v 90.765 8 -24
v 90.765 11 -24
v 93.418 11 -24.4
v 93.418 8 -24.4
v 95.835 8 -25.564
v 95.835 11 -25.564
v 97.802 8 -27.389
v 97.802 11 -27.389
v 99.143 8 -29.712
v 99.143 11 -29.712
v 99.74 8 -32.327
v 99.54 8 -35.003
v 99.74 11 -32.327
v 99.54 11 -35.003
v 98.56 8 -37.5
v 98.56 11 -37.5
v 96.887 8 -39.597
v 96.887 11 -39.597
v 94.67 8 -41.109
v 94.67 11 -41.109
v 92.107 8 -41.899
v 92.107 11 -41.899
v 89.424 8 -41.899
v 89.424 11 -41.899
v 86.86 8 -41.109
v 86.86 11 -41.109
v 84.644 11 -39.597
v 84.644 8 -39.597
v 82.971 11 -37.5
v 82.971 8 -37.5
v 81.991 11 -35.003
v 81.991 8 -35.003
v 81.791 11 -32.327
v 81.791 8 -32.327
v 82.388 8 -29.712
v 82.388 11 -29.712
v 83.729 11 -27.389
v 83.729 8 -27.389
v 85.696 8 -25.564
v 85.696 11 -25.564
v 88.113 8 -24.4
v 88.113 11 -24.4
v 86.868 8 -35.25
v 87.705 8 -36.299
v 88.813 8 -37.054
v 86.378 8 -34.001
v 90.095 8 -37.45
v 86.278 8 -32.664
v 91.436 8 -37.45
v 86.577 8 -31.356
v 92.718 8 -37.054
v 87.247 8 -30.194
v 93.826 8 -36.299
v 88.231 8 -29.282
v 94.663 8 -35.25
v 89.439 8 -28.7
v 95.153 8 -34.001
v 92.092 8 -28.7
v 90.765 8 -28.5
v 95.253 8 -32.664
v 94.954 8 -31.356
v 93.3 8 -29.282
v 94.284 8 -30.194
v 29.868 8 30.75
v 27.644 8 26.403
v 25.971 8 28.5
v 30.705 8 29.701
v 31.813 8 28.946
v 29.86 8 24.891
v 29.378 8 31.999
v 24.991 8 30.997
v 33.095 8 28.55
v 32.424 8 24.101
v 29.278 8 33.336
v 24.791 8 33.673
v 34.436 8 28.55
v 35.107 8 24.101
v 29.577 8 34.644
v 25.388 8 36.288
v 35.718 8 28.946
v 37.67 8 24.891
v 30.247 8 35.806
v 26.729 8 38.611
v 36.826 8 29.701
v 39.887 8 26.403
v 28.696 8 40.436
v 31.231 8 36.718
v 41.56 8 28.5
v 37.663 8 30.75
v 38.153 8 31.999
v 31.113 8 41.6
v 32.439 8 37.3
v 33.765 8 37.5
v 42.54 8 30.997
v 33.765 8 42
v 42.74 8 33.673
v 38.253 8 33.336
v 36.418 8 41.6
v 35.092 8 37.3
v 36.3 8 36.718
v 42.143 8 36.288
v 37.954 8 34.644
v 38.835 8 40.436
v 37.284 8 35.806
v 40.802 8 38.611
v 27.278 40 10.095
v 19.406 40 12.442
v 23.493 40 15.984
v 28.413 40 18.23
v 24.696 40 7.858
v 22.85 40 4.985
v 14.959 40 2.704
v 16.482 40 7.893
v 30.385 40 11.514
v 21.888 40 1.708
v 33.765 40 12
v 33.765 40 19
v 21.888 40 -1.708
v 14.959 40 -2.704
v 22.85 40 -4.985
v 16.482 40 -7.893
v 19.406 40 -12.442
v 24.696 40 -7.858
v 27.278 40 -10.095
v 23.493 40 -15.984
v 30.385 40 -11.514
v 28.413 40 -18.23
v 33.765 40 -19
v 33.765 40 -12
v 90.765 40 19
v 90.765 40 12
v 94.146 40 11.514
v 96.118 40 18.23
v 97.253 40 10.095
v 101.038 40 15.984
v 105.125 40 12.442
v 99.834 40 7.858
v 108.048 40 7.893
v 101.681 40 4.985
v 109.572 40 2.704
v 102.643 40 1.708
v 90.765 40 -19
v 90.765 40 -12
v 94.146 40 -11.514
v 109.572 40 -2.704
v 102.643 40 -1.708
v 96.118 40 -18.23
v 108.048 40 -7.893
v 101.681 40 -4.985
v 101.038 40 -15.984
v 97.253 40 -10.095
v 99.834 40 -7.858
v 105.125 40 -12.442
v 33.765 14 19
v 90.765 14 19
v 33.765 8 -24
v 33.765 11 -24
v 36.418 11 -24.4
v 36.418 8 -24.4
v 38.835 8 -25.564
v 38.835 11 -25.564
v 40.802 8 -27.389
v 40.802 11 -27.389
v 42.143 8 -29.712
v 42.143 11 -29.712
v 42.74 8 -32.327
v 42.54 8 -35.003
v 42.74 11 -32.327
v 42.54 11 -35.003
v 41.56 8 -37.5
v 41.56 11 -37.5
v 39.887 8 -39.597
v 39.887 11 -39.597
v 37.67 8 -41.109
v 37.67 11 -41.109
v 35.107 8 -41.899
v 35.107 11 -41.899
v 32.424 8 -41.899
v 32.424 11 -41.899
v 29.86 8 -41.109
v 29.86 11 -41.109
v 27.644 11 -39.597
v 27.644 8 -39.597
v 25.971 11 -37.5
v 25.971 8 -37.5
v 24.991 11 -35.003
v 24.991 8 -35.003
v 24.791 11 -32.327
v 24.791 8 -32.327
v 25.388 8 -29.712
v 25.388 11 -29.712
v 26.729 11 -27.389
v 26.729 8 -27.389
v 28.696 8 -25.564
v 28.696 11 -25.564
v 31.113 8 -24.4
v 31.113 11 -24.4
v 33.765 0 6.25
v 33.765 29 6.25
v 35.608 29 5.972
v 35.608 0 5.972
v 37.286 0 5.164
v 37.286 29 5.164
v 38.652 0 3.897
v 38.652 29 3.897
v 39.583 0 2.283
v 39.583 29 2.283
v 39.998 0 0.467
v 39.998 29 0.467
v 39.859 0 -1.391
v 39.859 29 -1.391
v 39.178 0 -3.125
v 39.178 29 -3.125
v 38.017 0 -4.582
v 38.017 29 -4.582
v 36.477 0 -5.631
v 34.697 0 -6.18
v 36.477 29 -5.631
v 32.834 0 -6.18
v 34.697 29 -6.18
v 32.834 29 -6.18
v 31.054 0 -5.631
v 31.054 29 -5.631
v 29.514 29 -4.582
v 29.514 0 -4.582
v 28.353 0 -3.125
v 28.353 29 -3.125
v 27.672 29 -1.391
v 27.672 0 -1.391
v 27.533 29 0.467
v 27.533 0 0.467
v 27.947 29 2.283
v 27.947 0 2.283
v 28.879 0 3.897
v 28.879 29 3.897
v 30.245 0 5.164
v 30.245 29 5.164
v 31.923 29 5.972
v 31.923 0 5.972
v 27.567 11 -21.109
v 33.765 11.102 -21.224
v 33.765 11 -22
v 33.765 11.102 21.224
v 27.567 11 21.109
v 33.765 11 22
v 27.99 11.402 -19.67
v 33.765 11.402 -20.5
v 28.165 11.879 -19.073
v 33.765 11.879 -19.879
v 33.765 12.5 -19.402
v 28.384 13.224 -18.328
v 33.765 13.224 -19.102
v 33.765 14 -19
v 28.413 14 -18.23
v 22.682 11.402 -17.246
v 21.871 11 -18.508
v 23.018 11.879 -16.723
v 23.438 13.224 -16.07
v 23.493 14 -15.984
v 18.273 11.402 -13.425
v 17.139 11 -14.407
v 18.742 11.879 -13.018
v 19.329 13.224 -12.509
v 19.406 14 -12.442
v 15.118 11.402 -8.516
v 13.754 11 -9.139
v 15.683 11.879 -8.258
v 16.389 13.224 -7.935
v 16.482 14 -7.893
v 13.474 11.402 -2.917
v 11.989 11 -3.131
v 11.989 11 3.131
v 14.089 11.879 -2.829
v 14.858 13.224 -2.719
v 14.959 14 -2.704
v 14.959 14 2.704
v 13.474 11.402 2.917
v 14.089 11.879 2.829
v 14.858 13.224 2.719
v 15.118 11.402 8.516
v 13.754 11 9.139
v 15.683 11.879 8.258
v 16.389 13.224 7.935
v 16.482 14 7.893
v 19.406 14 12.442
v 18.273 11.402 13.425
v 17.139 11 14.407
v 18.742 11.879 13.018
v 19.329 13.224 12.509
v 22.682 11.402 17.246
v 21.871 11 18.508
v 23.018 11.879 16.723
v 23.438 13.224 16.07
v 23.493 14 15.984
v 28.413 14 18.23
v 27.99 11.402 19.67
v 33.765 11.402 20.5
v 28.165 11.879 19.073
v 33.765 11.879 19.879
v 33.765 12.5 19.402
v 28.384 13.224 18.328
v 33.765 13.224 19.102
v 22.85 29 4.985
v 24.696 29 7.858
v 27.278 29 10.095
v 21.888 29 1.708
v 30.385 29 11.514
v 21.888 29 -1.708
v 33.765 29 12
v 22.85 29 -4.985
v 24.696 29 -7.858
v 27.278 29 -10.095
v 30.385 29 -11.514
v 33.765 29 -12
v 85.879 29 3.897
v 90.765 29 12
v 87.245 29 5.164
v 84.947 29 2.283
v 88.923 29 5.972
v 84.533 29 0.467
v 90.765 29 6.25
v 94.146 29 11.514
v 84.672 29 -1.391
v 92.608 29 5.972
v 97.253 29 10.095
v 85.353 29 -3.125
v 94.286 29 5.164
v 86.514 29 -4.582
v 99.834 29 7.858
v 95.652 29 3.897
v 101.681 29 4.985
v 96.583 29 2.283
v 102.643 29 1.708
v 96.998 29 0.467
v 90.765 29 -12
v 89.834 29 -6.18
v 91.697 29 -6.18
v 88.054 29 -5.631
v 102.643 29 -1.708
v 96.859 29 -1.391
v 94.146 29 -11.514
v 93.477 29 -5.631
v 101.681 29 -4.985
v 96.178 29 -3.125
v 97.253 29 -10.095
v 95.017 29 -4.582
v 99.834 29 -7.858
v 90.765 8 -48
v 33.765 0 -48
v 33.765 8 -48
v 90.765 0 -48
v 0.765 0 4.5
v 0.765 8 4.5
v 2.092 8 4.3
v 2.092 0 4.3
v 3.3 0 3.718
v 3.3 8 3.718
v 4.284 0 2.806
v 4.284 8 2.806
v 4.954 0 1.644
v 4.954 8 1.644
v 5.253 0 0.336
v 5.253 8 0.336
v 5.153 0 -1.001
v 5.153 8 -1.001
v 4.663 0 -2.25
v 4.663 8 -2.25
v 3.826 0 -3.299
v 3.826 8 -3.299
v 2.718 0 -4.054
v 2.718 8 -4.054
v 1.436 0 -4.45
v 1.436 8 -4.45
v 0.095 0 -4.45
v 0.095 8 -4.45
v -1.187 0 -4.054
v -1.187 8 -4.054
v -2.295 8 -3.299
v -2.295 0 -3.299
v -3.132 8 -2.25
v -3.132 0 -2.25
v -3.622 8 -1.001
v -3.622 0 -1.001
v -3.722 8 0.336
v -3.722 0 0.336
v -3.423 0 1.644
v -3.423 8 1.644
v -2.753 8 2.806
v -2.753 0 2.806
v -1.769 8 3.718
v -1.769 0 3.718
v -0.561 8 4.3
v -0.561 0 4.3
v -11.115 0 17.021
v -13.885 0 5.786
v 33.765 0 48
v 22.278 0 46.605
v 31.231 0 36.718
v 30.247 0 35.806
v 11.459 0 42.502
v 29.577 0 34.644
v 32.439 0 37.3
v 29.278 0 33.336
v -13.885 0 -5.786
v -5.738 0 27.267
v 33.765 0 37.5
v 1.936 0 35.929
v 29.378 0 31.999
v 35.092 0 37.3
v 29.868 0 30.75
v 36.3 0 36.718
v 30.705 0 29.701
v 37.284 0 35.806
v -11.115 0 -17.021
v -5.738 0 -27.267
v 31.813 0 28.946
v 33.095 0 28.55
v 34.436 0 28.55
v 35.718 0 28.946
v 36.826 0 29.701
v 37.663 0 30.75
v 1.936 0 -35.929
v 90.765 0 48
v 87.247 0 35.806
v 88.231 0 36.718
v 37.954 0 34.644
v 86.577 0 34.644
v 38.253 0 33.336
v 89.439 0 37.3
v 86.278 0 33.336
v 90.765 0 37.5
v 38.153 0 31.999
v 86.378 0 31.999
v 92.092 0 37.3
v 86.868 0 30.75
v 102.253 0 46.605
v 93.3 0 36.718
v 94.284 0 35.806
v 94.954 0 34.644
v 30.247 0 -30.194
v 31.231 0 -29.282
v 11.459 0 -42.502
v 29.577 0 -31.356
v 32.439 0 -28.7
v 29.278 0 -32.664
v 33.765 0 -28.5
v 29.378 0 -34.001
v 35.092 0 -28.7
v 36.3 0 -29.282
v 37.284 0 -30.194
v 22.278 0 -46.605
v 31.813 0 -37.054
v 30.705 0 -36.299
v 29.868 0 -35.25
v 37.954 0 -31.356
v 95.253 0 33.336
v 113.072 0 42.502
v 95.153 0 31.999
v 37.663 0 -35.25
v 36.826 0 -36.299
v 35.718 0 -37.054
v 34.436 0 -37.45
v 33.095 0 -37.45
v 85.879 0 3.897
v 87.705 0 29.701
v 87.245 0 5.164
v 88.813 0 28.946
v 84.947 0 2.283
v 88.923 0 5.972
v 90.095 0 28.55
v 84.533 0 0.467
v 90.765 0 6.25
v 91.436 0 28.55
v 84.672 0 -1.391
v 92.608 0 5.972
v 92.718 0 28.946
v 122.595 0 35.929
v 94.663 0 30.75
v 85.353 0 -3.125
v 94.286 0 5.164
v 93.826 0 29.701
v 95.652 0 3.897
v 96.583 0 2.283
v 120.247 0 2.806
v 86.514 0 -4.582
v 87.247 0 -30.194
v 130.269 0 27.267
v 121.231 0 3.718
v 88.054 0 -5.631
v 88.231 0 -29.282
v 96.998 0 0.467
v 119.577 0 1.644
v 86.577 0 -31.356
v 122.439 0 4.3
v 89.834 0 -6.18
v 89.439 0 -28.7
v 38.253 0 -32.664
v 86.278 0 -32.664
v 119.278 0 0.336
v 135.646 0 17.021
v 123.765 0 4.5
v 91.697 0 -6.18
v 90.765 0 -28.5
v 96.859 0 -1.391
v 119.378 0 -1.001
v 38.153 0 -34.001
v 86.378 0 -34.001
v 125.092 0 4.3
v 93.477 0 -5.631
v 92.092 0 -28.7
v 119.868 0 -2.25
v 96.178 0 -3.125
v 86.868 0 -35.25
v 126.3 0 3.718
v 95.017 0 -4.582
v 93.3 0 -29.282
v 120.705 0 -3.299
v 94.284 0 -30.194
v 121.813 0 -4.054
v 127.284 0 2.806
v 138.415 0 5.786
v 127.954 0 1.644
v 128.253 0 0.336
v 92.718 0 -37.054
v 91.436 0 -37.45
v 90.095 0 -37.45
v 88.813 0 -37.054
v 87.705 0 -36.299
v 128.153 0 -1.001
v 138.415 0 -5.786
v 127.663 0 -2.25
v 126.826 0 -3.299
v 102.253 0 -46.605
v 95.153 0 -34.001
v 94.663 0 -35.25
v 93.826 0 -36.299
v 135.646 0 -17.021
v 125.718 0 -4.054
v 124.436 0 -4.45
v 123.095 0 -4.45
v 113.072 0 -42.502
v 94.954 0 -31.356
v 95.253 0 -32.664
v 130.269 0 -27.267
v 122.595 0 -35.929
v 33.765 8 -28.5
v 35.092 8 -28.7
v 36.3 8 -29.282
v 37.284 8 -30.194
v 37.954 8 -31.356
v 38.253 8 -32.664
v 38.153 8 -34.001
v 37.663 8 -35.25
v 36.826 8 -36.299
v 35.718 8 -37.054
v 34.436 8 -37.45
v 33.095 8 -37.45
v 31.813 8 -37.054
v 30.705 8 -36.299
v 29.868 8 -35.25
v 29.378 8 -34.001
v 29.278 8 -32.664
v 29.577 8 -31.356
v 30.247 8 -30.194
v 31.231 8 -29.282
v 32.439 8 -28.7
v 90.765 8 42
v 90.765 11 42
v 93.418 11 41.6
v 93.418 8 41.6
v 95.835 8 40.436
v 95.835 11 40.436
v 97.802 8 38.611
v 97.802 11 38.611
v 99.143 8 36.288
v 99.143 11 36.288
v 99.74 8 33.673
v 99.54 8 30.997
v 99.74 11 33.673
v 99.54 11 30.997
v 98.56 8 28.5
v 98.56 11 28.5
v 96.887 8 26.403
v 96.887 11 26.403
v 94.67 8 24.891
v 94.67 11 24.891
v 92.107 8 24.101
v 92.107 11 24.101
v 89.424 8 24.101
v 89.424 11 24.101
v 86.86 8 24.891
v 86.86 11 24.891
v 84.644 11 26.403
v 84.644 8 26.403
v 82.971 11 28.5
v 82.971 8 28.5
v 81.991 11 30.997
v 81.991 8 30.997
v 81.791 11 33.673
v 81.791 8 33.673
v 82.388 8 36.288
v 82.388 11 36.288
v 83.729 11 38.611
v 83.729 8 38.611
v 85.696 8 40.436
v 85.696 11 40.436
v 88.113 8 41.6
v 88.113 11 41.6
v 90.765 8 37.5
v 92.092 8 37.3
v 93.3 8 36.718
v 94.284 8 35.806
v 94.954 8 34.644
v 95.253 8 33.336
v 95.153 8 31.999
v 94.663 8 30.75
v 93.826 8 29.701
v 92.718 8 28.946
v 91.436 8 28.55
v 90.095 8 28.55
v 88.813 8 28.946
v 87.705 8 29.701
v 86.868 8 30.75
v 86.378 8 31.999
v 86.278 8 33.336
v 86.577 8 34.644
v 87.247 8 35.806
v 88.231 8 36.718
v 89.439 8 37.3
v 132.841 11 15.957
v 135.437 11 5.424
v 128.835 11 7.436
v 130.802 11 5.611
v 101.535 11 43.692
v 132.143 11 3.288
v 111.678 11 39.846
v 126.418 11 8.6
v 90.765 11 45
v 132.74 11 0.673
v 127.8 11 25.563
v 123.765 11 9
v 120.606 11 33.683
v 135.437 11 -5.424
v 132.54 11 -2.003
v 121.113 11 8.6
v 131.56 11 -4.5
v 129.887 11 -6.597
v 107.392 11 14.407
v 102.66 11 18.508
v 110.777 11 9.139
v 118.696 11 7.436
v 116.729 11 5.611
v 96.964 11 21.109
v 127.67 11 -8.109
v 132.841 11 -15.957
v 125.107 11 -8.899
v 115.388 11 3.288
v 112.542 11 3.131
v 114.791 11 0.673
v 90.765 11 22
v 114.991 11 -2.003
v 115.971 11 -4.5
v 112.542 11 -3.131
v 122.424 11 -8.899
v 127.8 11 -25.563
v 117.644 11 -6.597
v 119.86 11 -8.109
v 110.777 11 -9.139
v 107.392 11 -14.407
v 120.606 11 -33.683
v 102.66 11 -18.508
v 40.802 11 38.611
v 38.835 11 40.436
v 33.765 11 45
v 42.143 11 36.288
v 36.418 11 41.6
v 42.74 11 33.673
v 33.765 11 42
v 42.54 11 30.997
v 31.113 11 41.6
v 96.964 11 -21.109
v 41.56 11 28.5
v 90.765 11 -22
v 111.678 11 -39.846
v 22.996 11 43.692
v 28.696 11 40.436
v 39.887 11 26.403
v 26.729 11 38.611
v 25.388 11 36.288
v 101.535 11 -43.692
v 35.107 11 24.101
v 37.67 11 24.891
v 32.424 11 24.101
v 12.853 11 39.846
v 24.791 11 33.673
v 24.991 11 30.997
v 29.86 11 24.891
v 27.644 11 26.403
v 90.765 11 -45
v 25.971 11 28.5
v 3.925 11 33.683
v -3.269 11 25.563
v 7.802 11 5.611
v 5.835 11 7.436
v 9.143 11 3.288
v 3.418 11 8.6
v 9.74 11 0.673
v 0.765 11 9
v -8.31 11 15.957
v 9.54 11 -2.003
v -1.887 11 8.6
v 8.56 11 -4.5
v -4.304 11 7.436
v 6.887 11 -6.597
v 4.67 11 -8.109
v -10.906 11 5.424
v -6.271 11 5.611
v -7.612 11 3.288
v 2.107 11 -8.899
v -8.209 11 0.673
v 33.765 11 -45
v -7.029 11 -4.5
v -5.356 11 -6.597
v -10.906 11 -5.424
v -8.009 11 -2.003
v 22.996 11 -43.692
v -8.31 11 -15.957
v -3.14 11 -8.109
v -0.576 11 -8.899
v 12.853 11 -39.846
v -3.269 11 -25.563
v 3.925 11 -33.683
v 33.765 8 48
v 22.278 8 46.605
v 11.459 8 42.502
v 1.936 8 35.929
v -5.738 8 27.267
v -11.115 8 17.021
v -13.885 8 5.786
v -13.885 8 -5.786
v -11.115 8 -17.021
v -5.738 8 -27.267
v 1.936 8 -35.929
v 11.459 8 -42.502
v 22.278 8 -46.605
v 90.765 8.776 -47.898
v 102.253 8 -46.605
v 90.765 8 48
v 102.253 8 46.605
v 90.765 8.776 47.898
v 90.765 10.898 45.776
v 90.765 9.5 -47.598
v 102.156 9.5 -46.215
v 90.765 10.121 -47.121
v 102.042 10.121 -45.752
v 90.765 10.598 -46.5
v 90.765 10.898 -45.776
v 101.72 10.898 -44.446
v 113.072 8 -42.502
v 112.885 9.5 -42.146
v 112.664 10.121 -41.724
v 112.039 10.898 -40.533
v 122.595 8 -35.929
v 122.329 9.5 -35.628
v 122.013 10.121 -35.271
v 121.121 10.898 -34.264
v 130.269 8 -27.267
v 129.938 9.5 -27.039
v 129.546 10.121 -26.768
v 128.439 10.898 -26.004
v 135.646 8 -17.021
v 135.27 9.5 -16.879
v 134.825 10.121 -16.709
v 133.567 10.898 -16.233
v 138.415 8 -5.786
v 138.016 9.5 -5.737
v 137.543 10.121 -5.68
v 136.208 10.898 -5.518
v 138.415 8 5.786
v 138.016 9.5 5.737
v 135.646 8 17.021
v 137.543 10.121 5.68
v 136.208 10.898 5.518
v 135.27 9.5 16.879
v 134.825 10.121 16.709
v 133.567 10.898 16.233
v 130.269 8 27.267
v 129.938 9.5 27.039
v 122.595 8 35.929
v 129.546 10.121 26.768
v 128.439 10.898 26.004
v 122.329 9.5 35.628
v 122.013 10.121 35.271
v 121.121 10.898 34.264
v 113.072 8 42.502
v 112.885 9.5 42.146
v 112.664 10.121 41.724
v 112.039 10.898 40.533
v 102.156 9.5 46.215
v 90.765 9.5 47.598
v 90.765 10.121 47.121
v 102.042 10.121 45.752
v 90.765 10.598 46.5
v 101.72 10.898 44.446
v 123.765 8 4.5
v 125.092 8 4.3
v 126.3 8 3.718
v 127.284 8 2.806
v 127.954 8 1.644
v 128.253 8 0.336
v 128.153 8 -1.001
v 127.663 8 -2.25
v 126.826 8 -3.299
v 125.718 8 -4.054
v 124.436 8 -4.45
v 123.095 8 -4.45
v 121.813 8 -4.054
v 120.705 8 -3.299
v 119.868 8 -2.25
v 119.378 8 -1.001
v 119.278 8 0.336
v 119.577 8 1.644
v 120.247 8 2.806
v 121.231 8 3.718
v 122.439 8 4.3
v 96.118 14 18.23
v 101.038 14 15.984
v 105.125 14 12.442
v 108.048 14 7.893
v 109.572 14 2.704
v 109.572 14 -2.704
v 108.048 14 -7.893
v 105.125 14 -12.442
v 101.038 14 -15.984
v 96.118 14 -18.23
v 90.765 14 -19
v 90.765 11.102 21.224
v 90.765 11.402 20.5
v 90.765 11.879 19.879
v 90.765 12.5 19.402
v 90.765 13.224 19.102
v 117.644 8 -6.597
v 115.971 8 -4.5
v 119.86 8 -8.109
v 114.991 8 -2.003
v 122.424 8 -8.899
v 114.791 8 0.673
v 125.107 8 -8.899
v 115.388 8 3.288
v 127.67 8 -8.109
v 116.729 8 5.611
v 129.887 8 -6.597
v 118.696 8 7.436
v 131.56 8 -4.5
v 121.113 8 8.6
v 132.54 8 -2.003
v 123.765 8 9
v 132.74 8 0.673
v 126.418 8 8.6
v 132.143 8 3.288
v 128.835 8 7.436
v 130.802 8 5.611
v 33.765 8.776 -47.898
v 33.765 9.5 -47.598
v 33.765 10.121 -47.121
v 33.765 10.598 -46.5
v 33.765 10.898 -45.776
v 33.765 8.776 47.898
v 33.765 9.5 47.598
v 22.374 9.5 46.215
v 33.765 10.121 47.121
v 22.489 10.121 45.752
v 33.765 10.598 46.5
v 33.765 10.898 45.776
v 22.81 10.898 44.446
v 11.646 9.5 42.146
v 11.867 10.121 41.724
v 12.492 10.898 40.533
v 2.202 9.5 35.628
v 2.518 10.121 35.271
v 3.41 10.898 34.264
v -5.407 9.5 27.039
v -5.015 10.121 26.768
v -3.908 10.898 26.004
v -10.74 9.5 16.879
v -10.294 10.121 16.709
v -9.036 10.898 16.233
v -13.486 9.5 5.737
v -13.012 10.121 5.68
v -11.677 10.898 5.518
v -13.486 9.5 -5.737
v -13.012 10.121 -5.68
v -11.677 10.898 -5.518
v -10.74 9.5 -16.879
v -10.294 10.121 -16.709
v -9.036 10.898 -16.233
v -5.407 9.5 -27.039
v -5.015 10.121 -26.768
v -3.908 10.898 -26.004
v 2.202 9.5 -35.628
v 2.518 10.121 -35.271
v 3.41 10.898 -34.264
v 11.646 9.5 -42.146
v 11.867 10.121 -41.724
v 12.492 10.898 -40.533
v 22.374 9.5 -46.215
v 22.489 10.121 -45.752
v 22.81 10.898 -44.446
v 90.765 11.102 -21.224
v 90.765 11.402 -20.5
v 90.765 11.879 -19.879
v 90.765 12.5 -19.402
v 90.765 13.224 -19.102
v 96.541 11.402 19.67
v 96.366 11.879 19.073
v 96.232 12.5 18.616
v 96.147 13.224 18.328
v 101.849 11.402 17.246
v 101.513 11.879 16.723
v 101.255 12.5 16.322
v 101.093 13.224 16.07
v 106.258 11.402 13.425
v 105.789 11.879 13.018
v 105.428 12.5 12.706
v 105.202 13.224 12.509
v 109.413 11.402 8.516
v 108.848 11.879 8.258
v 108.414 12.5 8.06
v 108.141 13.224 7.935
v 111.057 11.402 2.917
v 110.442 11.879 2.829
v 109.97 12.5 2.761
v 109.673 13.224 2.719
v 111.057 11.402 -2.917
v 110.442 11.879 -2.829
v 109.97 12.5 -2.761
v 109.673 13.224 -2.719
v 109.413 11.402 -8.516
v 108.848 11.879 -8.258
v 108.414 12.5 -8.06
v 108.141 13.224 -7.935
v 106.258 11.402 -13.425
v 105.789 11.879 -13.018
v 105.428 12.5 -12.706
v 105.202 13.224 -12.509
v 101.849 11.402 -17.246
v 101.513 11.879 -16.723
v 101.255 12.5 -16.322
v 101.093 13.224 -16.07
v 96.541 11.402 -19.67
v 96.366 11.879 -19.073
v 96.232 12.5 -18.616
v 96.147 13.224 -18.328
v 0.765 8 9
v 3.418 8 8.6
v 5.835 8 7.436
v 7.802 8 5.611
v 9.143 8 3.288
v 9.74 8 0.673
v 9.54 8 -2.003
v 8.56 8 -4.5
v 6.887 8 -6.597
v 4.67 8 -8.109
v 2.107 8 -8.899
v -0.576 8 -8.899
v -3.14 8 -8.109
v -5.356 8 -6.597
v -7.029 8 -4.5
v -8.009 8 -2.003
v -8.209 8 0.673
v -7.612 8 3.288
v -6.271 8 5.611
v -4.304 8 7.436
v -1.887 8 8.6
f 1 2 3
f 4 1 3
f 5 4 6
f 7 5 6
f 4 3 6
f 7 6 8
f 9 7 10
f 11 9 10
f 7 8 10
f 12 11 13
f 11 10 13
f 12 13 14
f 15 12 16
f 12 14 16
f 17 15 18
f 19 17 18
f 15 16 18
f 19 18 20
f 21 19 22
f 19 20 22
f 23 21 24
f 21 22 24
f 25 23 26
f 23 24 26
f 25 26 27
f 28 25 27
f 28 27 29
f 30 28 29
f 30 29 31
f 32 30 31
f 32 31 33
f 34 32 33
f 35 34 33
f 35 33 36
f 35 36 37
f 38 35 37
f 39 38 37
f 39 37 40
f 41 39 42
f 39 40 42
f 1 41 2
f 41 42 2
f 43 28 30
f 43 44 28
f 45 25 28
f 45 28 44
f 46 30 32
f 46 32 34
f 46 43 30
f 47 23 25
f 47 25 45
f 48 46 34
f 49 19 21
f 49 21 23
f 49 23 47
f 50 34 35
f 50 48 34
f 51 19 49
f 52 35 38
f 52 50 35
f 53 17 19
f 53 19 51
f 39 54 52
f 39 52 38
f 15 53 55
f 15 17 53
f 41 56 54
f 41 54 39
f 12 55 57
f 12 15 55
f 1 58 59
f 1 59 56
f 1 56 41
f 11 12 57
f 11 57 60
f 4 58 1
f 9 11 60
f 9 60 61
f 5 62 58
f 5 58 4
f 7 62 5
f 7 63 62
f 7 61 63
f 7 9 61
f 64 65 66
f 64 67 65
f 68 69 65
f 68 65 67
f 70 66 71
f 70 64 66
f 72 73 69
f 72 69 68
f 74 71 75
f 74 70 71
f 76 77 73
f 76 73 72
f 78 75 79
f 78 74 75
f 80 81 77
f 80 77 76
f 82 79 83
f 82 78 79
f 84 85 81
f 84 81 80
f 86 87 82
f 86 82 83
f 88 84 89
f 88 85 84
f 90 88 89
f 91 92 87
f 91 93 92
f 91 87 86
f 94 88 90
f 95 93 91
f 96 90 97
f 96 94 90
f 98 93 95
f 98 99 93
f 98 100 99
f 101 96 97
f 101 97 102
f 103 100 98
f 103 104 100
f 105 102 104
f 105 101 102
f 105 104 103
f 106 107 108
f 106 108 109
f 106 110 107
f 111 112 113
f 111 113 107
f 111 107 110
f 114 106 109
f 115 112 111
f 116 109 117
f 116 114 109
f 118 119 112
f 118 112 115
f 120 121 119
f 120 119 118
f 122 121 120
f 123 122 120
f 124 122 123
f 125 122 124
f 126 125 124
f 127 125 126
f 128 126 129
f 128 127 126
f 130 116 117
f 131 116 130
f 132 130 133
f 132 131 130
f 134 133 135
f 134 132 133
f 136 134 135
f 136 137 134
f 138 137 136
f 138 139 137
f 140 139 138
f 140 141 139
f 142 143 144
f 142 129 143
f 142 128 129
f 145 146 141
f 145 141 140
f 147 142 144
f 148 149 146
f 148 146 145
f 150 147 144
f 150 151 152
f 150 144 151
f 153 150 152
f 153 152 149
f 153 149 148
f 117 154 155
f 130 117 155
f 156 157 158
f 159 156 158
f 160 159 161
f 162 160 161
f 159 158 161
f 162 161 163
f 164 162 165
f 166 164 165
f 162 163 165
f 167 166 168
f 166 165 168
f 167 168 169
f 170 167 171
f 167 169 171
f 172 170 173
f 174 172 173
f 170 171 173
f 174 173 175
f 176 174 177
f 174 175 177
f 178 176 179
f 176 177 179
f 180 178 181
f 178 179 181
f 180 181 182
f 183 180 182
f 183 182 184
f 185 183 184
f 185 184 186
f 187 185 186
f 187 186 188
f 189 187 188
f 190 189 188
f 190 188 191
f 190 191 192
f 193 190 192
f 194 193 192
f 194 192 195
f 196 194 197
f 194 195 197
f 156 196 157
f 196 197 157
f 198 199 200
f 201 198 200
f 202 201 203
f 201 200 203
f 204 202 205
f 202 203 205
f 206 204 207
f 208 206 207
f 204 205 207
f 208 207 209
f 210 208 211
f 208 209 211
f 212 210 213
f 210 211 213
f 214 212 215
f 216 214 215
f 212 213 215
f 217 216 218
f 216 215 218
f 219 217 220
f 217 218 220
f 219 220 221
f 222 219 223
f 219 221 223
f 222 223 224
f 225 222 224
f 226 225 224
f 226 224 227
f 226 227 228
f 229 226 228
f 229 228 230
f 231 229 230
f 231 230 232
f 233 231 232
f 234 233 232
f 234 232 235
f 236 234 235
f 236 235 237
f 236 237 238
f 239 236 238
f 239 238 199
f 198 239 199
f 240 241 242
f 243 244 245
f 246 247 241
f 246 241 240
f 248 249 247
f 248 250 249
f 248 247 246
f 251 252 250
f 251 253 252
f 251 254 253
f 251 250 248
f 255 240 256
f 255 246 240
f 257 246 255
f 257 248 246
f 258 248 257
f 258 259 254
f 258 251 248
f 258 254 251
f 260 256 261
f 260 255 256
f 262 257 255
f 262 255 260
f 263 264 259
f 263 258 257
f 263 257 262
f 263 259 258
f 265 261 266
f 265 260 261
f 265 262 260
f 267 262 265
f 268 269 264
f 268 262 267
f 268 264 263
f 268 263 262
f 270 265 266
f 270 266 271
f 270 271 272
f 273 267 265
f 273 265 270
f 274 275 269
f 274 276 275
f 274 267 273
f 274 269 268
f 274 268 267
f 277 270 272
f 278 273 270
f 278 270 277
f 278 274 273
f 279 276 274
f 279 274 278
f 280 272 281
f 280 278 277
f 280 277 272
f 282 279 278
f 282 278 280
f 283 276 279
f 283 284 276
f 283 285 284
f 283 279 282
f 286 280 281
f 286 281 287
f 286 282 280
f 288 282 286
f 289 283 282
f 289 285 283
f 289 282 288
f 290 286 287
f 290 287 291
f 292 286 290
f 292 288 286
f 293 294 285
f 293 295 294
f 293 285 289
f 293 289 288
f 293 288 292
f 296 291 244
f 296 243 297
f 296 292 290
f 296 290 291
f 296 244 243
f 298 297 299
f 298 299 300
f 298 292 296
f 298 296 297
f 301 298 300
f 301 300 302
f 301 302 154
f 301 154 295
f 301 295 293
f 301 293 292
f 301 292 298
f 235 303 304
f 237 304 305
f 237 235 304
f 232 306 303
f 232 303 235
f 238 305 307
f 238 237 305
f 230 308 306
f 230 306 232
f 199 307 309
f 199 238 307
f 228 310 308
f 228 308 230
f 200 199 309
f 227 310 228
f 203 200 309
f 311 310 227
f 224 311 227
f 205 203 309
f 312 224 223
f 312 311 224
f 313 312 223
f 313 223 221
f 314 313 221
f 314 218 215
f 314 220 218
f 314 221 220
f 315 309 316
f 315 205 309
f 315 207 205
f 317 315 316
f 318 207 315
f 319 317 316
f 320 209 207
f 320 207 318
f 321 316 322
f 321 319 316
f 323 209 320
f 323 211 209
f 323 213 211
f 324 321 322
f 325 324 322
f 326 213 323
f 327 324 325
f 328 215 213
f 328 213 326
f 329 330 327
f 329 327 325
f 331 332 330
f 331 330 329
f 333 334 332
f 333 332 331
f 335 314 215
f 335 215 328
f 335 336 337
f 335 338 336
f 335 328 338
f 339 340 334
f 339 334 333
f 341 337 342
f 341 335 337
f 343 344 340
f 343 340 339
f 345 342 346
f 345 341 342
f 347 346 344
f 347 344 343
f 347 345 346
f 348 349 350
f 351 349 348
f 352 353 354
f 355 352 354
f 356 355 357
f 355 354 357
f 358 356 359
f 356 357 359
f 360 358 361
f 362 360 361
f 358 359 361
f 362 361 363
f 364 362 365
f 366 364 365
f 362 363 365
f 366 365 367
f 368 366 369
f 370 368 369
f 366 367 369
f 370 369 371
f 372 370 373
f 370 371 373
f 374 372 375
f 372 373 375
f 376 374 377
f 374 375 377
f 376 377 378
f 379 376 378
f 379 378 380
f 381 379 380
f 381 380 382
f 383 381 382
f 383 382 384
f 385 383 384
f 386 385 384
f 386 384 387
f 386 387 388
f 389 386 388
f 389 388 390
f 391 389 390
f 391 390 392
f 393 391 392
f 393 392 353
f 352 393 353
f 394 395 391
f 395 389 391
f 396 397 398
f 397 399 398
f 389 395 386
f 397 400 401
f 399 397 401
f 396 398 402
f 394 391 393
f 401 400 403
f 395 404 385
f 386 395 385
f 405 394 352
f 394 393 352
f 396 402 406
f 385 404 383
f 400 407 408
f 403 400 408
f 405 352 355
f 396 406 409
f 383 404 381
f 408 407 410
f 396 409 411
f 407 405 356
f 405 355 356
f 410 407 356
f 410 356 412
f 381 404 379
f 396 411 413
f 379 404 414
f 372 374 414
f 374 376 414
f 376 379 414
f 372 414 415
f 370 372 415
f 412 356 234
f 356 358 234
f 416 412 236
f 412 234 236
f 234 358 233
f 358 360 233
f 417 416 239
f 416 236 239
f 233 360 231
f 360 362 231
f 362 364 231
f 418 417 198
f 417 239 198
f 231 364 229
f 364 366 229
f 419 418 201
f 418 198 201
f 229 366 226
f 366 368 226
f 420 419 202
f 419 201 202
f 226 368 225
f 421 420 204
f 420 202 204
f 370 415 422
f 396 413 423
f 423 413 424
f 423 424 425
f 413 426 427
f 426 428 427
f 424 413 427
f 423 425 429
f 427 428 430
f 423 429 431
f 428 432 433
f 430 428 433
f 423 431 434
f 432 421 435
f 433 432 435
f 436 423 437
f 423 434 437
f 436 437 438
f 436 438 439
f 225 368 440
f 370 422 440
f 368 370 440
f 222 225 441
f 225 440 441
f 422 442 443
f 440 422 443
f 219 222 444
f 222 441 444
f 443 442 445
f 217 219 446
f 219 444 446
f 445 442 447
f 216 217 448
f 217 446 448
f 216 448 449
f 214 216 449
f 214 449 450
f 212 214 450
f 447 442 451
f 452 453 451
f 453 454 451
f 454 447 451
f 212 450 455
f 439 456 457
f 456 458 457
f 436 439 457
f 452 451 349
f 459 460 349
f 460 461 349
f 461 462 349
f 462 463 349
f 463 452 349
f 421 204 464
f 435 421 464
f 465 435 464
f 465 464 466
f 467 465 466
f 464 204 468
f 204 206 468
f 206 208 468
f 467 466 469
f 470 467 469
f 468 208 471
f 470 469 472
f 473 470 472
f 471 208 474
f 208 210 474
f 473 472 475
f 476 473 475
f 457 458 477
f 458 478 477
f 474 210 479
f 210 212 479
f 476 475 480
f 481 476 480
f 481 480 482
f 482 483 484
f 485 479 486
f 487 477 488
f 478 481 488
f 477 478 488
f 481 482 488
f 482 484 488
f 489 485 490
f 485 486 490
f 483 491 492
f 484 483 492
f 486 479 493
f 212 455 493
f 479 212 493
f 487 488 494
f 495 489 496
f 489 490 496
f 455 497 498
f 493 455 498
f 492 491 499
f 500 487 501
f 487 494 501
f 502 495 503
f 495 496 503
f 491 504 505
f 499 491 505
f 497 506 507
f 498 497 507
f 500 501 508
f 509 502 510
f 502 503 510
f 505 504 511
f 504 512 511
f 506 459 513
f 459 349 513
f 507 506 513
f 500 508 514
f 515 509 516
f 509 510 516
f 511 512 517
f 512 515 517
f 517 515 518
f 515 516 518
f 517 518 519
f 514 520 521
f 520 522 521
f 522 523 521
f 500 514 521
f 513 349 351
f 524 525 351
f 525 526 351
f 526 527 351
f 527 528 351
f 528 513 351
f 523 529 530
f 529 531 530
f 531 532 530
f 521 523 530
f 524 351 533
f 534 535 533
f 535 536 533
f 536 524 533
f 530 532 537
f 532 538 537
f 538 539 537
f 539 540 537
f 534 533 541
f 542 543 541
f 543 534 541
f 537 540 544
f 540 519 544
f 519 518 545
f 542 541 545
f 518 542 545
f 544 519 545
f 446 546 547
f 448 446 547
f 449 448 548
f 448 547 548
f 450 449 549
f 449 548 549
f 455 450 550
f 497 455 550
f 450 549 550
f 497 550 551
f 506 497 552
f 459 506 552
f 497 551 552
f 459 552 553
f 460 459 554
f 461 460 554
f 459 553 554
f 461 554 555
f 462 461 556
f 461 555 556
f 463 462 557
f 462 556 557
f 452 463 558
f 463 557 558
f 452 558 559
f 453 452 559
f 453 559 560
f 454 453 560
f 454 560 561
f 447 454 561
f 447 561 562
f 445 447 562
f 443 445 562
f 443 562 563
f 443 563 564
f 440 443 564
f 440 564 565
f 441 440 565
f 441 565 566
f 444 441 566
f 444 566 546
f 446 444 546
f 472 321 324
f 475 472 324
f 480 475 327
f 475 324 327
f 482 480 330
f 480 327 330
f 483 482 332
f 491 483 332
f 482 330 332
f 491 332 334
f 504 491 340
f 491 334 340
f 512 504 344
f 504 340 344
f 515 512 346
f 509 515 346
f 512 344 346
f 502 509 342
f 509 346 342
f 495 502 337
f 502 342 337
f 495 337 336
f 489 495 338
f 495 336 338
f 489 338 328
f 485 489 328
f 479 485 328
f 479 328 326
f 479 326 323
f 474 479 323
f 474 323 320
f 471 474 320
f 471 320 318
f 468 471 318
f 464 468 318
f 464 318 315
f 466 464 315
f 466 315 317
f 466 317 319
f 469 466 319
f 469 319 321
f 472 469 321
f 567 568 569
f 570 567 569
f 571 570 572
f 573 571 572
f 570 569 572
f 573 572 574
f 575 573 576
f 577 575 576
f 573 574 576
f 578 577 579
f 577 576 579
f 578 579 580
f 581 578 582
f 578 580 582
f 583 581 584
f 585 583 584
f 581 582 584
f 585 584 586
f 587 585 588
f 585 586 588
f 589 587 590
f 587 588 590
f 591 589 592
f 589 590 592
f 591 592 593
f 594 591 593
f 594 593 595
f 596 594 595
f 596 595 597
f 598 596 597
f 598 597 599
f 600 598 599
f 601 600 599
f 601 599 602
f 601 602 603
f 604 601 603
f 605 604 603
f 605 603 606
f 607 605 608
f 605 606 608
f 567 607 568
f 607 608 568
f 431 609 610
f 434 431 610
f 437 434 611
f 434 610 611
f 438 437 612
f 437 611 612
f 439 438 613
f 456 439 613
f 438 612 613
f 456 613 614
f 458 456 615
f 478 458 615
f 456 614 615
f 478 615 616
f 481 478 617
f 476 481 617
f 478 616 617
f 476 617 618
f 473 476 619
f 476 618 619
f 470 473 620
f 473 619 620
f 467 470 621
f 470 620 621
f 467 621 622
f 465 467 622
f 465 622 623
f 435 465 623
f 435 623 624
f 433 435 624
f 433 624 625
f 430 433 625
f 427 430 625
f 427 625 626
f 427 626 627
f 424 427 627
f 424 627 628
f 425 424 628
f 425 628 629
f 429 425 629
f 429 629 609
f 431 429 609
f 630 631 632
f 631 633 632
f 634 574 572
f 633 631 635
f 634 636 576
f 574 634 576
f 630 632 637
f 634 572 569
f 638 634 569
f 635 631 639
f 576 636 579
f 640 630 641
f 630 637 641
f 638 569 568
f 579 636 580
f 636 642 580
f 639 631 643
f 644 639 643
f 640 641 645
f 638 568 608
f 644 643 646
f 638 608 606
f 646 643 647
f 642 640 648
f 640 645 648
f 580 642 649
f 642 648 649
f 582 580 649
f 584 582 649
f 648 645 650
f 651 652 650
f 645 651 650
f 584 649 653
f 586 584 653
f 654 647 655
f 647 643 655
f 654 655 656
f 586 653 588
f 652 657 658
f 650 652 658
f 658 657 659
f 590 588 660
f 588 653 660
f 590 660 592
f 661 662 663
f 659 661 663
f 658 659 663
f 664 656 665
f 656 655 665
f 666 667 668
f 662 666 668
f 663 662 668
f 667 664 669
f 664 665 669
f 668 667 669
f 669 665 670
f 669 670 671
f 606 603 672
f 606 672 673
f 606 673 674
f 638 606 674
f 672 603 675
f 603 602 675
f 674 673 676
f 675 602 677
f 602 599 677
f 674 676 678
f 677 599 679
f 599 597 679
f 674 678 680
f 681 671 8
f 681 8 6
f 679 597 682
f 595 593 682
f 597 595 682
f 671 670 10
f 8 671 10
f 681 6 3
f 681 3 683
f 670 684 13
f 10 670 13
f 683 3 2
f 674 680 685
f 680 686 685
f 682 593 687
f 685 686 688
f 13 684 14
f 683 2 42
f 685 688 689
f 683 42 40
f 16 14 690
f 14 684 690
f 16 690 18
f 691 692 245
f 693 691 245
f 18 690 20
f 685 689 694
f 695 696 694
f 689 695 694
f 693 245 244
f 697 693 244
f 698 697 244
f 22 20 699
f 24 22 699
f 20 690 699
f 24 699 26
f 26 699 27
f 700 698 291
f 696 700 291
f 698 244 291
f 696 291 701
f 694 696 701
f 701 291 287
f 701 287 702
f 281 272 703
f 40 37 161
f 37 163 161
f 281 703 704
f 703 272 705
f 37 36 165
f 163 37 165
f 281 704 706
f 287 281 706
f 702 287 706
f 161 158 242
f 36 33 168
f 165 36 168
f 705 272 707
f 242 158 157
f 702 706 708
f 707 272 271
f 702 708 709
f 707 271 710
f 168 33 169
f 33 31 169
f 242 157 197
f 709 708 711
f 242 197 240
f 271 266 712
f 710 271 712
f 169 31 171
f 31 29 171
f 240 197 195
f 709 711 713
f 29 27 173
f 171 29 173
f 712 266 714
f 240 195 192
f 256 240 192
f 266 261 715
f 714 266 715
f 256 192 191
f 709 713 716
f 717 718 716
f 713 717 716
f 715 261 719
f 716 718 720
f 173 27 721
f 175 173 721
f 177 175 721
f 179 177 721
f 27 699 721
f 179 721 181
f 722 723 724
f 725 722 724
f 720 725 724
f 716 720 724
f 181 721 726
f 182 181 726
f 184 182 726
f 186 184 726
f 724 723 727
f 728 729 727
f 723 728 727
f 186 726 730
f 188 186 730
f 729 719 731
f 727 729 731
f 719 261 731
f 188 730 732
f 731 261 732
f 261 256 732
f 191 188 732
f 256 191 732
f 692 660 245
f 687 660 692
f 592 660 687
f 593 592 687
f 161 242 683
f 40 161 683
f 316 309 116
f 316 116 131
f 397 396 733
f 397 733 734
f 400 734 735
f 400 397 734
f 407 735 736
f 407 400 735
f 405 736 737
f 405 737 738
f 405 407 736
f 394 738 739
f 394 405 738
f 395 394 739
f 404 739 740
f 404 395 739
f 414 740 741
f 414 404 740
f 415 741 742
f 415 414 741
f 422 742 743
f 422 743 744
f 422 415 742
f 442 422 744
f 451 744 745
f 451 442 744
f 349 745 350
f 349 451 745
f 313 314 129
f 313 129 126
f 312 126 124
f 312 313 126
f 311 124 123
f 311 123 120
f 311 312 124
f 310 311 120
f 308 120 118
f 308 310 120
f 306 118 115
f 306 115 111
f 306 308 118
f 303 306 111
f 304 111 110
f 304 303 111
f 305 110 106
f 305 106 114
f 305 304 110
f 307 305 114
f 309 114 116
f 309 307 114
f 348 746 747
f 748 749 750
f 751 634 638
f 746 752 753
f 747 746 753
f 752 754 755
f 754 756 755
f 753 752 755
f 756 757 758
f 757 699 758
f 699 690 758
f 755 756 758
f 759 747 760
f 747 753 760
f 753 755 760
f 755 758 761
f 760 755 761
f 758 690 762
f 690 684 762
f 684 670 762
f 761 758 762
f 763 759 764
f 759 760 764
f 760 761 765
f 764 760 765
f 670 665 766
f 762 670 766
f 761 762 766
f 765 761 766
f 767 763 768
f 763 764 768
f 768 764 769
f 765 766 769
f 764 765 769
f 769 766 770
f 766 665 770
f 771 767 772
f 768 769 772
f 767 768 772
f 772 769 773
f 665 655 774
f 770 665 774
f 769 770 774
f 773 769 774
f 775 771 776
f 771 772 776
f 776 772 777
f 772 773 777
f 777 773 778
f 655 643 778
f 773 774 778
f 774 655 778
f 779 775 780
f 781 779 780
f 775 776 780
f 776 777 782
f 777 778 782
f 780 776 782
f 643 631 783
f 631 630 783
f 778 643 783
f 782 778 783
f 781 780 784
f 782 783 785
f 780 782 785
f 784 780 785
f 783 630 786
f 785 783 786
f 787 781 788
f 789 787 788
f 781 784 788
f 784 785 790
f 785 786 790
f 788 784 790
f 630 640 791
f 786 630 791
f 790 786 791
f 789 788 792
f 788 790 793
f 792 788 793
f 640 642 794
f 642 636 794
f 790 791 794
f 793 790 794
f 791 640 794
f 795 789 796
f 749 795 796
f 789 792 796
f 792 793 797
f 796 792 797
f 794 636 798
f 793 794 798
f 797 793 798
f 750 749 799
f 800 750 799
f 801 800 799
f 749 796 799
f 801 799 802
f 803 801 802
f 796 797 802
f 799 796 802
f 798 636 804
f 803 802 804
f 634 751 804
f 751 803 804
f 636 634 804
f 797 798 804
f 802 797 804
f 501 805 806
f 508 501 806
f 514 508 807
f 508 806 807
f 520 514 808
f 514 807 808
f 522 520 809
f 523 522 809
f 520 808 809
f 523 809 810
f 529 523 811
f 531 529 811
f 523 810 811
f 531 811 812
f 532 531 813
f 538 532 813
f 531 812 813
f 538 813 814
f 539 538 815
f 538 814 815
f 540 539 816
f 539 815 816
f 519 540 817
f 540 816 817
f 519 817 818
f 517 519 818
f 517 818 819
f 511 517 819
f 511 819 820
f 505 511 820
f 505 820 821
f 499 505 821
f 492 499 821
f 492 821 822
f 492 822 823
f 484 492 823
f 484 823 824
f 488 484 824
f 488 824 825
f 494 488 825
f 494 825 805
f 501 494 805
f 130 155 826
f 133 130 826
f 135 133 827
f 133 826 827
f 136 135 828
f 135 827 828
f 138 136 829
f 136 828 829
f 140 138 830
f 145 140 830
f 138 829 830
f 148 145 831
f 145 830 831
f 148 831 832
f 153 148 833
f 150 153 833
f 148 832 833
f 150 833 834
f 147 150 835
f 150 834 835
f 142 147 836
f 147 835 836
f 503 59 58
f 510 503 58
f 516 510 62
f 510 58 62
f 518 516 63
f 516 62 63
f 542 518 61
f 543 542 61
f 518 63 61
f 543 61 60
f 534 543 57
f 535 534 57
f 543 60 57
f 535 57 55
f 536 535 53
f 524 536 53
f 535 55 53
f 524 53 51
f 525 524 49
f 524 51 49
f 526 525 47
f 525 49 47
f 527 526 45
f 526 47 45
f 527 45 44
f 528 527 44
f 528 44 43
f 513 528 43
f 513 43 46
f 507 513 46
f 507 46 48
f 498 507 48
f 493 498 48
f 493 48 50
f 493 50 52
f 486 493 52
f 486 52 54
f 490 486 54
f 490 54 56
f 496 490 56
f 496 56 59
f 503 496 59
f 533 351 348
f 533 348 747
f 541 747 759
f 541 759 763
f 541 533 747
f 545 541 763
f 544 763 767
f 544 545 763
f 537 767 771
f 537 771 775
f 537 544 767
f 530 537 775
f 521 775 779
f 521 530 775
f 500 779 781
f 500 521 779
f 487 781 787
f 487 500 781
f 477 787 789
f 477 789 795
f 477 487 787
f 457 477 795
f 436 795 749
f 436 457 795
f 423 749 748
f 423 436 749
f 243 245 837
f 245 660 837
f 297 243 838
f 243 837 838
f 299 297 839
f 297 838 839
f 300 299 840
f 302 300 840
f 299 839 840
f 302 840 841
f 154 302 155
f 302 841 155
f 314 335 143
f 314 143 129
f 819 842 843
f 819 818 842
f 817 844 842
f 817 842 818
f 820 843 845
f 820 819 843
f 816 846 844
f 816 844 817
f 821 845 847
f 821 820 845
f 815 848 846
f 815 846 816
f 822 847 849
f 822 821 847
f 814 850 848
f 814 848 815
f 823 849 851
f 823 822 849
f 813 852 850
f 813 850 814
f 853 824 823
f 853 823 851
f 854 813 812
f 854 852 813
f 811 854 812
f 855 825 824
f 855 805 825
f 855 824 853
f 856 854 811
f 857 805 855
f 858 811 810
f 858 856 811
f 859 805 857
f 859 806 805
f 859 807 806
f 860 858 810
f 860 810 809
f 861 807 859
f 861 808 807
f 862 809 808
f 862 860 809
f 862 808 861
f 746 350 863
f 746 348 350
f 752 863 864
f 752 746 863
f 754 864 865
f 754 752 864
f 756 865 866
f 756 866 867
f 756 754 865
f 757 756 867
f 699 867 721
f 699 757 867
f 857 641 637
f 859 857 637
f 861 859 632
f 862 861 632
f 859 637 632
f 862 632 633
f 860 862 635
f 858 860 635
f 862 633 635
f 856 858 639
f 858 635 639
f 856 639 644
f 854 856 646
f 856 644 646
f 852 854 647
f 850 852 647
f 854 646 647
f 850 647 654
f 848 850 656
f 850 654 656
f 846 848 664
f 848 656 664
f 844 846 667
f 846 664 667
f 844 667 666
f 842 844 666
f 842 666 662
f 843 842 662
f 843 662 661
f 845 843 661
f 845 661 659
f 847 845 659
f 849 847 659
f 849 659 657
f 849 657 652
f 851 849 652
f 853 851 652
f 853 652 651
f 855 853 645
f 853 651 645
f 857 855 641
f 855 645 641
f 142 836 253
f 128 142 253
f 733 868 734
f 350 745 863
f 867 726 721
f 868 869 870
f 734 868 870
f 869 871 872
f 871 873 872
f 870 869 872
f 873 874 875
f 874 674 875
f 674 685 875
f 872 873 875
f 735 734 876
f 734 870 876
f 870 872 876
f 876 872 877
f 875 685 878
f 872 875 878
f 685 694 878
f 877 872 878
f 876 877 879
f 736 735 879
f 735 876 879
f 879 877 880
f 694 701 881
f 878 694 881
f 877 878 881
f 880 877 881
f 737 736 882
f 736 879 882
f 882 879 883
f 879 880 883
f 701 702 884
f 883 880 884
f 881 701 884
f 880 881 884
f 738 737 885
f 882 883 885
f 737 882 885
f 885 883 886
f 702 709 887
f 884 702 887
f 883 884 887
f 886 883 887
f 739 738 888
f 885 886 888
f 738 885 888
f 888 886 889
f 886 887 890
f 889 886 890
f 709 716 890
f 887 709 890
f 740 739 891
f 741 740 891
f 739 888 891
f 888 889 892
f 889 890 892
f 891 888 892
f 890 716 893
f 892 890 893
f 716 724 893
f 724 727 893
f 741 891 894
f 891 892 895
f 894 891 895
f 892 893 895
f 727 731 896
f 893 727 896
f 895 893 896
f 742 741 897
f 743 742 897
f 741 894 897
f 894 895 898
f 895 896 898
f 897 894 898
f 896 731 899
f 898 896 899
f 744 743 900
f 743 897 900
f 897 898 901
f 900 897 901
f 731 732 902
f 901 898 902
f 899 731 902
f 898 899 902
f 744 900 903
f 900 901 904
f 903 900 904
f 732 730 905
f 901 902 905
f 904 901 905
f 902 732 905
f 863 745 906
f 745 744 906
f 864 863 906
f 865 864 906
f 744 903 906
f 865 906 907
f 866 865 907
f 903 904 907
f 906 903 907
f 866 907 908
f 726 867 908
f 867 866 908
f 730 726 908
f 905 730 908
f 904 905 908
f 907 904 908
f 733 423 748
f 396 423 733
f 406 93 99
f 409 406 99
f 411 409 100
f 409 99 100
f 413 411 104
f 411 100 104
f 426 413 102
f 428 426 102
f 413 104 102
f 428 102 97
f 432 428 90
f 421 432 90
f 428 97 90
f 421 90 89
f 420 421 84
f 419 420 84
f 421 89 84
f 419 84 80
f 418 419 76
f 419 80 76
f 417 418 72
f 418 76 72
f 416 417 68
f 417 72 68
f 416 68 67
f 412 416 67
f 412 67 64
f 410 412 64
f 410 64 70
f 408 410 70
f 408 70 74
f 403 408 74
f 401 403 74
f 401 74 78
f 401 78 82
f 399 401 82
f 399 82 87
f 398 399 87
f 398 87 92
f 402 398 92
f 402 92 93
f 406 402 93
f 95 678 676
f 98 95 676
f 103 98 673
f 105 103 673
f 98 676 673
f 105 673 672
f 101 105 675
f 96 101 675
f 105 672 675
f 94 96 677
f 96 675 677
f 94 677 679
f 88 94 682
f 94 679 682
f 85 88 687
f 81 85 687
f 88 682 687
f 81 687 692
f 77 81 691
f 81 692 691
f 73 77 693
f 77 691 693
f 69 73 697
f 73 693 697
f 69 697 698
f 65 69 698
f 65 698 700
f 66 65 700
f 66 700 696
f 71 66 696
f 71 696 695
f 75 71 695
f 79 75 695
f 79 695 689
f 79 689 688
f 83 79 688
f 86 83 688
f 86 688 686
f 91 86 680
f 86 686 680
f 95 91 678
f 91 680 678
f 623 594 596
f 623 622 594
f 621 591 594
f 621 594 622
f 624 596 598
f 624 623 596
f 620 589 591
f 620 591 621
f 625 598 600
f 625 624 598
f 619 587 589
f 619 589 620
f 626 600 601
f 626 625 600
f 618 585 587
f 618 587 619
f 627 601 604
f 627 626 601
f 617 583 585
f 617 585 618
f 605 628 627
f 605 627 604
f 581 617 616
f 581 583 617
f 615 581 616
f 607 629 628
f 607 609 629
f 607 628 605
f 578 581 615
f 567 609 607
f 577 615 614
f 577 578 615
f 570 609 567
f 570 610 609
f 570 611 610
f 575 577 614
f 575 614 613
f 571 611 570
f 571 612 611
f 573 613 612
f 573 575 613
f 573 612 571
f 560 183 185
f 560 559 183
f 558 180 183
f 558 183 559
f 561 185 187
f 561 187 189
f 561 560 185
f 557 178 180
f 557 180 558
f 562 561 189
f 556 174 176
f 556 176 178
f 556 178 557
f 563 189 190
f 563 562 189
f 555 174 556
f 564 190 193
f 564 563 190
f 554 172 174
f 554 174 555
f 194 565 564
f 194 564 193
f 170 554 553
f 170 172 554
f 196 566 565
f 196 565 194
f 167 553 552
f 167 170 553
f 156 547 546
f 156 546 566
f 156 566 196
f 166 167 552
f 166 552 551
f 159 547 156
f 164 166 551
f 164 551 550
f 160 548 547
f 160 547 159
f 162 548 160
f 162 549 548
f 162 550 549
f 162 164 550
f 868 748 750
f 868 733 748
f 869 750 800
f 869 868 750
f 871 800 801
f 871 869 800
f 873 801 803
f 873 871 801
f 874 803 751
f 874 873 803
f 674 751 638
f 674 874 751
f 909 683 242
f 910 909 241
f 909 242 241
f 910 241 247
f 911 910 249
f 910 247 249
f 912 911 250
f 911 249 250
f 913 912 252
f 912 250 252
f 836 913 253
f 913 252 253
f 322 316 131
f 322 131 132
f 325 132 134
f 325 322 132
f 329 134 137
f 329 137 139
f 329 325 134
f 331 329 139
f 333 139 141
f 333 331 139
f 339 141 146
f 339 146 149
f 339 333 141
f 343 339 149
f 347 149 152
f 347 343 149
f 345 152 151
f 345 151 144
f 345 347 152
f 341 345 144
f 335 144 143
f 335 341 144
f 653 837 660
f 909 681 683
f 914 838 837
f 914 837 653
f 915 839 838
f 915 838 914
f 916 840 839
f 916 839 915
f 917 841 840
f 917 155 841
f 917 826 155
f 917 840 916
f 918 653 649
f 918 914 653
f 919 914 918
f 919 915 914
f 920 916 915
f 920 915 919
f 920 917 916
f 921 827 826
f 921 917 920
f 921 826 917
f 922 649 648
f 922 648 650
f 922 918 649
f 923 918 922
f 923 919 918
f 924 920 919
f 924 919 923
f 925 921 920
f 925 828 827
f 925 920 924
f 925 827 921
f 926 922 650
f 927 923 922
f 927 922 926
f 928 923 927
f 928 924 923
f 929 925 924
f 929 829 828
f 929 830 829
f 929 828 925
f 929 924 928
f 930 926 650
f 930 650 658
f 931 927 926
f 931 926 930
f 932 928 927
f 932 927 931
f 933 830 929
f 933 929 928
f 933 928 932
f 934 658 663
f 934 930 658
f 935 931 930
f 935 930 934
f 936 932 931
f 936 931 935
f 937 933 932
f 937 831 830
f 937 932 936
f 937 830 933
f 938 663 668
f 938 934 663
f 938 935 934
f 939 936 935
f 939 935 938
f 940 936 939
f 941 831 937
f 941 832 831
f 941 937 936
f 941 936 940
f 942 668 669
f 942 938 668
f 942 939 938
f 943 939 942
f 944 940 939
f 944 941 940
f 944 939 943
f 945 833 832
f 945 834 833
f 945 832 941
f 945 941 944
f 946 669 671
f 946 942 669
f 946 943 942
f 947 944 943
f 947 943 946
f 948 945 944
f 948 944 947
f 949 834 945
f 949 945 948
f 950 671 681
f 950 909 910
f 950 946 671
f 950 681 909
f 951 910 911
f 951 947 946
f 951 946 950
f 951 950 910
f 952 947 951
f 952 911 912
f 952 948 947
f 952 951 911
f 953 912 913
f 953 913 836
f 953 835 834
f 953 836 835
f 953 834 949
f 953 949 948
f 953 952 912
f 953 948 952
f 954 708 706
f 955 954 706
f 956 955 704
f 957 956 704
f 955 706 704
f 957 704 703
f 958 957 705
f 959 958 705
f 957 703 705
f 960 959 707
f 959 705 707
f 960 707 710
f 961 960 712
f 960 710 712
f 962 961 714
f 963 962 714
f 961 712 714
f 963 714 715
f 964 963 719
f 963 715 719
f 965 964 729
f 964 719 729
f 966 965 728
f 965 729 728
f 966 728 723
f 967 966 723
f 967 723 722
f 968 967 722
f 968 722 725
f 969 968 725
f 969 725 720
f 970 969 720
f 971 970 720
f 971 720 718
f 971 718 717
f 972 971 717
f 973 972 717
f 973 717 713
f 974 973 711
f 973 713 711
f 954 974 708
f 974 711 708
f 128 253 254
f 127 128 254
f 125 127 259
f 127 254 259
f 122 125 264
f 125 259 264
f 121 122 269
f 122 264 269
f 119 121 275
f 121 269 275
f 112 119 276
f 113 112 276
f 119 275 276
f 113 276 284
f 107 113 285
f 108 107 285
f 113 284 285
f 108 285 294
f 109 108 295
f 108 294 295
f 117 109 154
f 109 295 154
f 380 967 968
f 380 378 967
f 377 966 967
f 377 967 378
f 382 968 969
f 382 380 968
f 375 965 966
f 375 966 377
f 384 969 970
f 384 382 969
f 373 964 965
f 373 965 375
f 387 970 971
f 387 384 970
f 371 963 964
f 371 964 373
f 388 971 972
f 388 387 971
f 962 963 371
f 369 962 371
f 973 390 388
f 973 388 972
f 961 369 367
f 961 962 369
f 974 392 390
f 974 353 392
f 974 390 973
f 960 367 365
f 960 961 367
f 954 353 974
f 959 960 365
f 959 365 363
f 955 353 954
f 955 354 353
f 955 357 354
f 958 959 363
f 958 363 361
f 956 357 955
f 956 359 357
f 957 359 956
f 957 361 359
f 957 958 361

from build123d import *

# Parameters (mm, degrees)
EXTRUDE_1_DEPTH     = 11
SKETCH_4_R          = 9
SKETCH_4_R_2        = 4.5
CUT_EXTRUDE_1_DEPTH = 3
SKETCH_4_3_R        = 4.5
CUT_EXTRUDE_2_DEPTH = 11
EXTRUDE_3_DEPTH     = 40
EXTRUDE_4_DEPTH     = 29
SKETCH_8_R          = 6.25
CUT_EXTRUDE_3_DEPTH = 150.66913845
FILLET_1_R          = 3
FILLET_2_R          = 3


with BuildPart() as part:
    # 스케치1 → 보스-돌출1 (new body)
    with BuildSketch(Plane(origin=(0, 0, 0), x_dir=(1, 0, 0), z_dir=(0, 1, 0))):
        with BuildLine():
            Line((33.765453209, 48), (90.765453209, 48))
            ThreePointArc((90.765453209, 48), (138.765453209, 0), (90.765453209, -48))
            Line((90.765453209, -48), (33.765453209, -48))
            ThreePointArc((33.765453209, -48), (-14.234546791, 0), (33.765453209, 48))
        make_face()
    extrude(amount=EXTRUDE_1_DEPTH)

    # 스케치4 → 컷-돌출1 (cut)
    # profile 1 of 6: a face of its own
    with BuildSketch(Plane(origin=(0, 11, 0), x_dir=(1, 0, 0), z_dir=(0, 1, 0))):
        with Locations((33.765453209, 33)):
            Circle(SKETCH_4_R)
        with Locations((33.765453209, 33)):
            Circle(SKETCH_4_R_2, mode=Mode.SUBTRACT)
    # profile 2 of 6: a face of its own
    with BuildSketch(Plane(origin=(0, 11, 0), x_dir=(1, 0, 0), z_dir=(0, 1, 0))):
        with Locations((90.765453209, 33)):
            Circle(SKETCH_4_R)
        with Locations((90.765453209, 33)):
            Circle(SKETCH_4_R_2, mode=Mode.SUBTRACT)
    # profile 3 of 6: a face of its own
    with BuildSketch(Plane(origin=(0, 11, 0), x_dir=(1, 0, 0), z_dir=(0, 1, 0))):
        with Locations((123.765453209, 0)):
            Circle(SKETCH_4_R)
        with Locations((123.765453209, 0)):
            Circle(SKETCH_4_R_2, mode=Mode.SUBTRACT)
    # profile 4 of 6: a face of its own
    with BuildSketch(Plane(origin=(0, 11, 0), x_dir=(1, 0, 0), z_dir=(0, 1, 0))):
        with Locations((90.765453209, -33)):
            Circle(SKETCH_4_R)
        with Locations((90.765453209, -33)):
            Circle(SKETCH_4_R_2, mode=Mode.SUBTRACT)
    # profile 5 of 6: a face of its own
    with BuildSketch(Plane(origin=(0, 11, 0), x_dir=(1, 0, 0), z_dir=(0, 1, 0))):
        with Locations((33.765453209, -33)):
            Circle(SKETCH_4_R)
        with Locations((33.765453209, -33)):
            Circle(SKETCH_4_R_2, mode=Mode.SUBTRACT)
    # profile 6 of 6: a face of its own
    with BuildSketch(Plane(origin=(0, 11, 0), x_dir=(1, 0, 0), z_dir=(0, 1, 0))):
        with Locations((0.765453209, 0)):
            Circle(SKETCH_4_R)
        with Locations((0.765453209, 0)):
            Circle(SKETCH_4_R_2, mode=Mode.SUBTRACT)
    extrude(amount=-CUT_EXTRUDE_1_DEPTH, mode=Mode.SUBTRACT)

    # 스케치4<3> → 컷-돌출2 (cut)
    with BuildSketch(Plane(origin=(0, 11, 0), x_dir=(1, 0, 0), z_dir=(0, 1, 0))):
        with Locations((33.765453209, 33)):
            Circle(SKETCH_4_3_R)
        with Locations((90.765453209, 33)):
            Circle(SKETCH_4_3_R)
        with Locations((123.765453209, 0)):
            Circle(SKETCH_4_3_R)
        with Locations((90.765453209, -33)):
            Circle(SKETCH_4_3_R)
        with Locations((33.765453209, -33)):
            Circle(SKETCH_4_3_R)
        with Locations((0.765453209, 0)):
            Circle(SKETCH_4_3_R)
    extrude(amount=-CUT_EXTRUDE_2_DEPTH, mode=Mode.SUBTRACT)

    # 스케치1<5> → 보스-돌출3 (add)
    with BuildSketch(Plane(origin=(0, 0, 0), x_dir=(1, 0, 0), z_dir=(0, 1, 0))):
        with BuildLine():
            Line((90.765453209, 19), (33.765453209, 19))
            ThreePointArc((33.765453209, 19), (14.765453209, 0), (33.765453209, -19))
            Line((33.765453209, -19), (90.765453209, -19))
            ThreePointArc((90.765453209, -19), (109.765453209, 0), (90.765453209, 19))
        make_face()
        with BuildLine():
            ThreePointArc((33.765453209, -12), (21.765453209, 0), (33.765453209, 12))
            Line((33.765453209, 12), (90.765453209, 12))
            ThreePointArc((90.765453209, 12), (102.765453209, 0), (90.765453209, -12))
            Line((90.765453209, -12), (33.765453209, -12))
        make_face(mode=Mode.SUBTRACT)
    extrude(amount=EXTRUDE_3_DEPTH)

    # 스케치1<6> → 보스-돌출4 (add)
    with BuildSketch(Plane(origin=(0, 0, 0), x_dir=(1, 0, 0), z_dir=(0, 1, 0))):
        with BuildLine():
            Line((90.765453209, 12), (33.765453209, 12))
            ThreePointArc((33.765453209, 12), (21.765453209, 0), (33.765453209, -12))
            Line((33.765453209, -12), (90.765453209, -12))
            ThreePointArc((90.765453209, -12), (102.765453209, 0), (90.765453209, 12))
        make_face()
    extrude(amount=EXTRUDE_4_DEPTH)

    # 스케치8 → 컷-돌출3 (cut, through all)
    with BuildSketch(Plane(origin=(0, 29, 0), x_dir=(1, 0, 0), z_dir=(0, 1, 0))):
        with Locations((33.765453209, 0)):
            Circle(SKETCH_8_R)
        with Locations((90.765453209, 0)):
            Circle(SKETCH_8_R)
    extrude(amount=-CUT_EXTRUDE_3_DEPTH, mode=Mode.SUBTRACT)

    # 필렛1
    fillet_1_edges = [part.edges().sort_by_distance(p)[0] for p in [
        (-14.234546791, 11, 0),
        (62.265453209, 11, -48),
        (138.765453209, 11, 0),
        (62.265453209, 11, 48),
    ]]
    fillet(fillet_1_edges, radius=FILLET_1_R)

    # 필렛2
    fillet_2_edges = [part.edges().sort_by_distance(p)[0] for p in [
        (62.265453209, 11, -19),
        (14.765453209, 11, 0),
        (109.765453209, 11, 0),
        (62.265453209, 11, 19),
    ]]
    fillet(fillet_2_edges, radius=FILLET_2_R)


solid = part.part
